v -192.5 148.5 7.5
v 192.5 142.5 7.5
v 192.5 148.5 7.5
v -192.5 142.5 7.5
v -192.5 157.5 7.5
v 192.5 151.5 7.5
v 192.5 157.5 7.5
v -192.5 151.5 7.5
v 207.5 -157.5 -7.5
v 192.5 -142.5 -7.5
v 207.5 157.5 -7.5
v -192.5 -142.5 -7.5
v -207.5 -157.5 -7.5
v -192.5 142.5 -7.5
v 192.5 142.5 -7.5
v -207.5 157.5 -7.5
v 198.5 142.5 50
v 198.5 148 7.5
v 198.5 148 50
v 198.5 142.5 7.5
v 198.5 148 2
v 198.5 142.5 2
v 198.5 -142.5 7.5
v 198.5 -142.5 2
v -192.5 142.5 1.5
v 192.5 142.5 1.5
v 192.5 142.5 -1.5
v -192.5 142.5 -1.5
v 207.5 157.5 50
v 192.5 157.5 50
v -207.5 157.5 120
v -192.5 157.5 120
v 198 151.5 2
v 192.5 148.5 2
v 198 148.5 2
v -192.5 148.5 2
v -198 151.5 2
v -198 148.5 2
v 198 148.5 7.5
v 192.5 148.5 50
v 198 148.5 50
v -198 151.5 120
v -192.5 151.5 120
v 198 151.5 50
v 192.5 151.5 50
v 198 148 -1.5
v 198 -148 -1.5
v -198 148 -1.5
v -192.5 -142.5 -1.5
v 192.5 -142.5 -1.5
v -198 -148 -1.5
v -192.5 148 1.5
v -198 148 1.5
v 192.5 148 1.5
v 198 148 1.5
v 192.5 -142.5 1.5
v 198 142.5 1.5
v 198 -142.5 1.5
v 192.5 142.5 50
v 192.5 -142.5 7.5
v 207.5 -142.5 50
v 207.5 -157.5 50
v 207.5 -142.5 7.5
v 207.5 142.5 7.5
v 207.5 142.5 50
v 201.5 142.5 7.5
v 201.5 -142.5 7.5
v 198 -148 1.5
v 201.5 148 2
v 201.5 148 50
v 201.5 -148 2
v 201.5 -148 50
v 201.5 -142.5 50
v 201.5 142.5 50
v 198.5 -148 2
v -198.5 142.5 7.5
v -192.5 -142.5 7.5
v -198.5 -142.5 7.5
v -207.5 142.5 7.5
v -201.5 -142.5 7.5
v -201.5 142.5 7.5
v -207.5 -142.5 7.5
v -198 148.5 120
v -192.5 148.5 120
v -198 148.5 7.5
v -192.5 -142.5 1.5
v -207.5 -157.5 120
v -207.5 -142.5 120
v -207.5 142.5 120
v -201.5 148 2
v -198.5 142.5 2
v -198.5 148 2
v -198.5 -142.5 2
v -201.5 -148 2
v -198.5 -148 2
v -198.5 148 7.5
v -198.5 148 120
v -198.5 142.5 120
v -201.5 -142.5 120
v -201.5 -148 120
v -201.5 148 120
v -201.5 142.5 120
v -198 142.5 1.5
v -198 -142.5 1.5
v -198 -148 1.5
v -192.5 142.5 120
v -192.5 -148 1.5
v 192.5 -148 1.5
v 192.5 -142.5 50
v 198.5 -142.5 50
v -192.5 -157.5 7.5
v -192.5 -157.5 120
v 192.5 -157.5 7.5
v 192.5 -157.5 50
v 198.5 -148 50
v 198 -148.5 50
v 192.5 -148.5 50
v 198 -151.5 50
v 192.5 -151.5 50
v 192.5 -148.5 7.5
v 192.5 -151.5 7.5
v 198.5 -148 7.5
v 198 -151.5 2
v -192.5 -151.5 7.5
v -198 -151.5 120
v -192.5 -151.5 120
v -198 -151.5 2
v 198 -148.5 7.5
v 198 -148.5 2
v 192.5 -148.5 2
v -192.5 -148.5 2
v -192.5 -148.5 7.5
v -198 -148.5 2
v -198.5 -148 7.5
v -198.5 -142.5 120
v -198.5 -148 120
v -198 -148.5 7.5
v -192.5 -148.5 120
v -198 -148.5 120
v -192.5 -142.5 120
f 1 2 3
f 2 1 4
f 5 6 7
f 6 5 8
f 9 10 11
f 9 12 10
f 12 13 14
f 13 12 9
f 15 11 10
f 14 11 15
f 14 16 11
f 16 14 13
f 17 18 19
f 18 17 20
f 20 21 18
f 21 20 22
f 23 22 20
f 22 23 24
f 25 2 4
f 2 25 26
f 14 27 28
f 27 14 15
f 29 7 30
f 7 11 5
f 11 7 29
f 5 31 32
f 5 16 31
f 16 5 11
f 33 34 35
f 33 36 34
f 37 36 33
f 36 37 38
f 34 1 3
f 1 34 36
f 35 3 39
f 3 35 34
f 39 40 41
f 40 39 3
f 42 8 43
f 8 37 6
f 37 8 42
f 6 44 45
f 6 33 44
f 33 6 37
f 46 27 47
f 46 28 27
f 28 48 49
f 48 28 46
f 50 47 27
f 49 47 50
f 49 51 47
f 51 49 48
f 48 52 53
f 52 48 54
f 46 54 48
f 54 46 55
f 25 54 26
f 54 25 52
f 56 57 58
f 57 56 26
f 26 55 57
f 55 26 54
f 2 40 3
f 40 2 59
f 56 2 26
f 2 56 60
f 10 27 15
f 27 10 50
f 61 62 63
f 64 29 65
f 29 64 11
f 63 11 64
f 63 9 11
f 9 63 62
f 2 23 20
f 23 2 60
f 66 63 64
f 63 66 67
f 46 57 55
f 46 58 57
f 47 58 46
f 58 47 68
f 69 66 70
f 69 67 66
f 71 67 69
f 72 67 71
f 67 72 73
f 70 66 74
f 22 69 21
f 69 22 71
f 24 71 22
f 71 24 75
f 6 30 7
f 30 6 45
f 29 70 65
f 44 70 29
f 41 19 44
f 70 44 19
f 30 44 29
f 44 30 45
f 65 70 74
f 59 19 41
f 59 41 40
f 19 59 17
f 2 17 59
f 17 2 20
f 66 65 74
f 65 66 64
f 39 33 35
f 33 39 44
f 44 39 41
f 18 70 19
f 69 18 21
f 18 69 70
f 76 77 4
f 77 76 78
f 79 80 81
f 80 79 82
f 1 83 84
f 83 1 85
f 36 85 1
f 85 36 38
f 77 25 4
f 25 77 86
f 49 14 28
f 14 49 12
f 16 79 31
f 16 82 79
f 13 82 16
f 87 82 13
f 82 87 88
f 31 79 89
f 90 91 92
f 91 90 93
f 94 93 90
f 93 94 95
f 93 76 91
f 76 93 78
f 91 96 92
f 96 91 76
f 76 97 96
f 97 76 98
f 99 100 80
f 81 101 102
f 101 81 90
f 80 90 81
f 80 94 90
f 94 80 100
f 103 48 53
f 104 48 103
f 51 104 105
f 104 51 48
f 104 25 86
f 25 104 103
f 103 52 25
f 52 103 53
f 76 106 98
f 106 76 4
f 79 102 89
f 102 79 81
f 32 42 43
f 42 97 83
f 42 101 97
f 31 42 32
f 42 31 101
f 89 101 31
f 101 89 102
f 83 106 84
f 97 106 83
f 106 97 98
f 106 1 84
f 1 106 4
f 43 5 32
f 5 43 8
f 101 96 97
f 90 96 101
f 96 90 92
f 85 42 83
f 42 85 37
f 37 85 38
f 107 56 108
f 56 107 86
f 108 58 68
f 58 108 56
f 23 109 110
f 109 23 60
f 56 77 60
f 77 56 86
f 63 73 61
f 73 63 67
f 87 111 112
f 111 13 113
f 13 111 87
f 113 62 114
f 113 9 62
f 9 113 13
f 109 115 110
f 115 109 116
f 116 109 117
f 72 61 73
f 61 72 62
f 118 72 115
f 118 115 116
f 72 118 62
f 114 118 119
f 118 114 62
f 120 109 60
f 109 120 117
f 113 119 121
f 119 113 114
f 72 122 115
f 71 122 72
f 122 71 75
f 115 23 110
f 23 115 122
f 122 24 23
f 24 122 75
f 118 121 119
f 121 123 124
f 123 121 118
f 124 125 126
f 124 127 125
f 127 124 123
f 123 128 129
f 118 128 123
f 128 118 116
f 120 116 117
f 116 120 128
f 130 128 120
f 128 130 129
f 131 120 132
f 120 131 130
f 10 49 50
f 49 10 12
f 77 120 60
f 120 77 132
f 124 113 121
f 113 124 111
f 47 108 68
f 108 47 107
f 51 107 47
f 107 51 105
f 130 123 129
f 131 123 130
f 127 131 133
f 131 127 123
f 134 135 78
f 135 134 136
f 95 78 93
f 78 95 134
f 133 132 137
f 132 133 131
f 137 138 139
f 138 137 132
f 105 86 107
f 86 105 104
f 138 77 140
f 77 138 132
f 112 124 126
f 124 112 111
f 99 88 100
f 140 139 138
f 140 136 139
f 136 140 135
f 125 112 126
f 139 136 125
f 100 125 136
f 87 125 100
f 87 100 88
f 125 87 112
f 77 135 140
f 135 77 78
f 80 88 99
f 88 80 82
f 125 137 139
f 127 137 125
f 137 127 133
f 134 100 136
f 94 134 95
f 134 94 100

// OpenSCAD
$fn = 20;
union()
{
  translate(v = [200, 150, 0])
  {
    rotate(a = [0, 0, 180], v = undef)
    {
      union()
      {
        translate(v = [100.75, 0, 0])
        {
          difference()
          {
            difference()
            {
              cube(size = [198.5, 15, 15], center = true);
              translate(v = [0, 0, 5.5])
              {
                cube(size = [199.5, 3, 7], center = true);
              }
            }
            rotate(a = [-90, 0, 0], v = undef)
            {
              translate(v = [0, 0, 5.5])
              {
                cube(size = [199.5, 3, 7], center = true);
              }
            }
          }
        }
        translate(v = [0, 75.75, 0])
        {
          rotate(a = [90, 0, 90], v = undef)
          {
            difference()
            {
              difference()
              {
                cube(size = [148.5, 15, 15], center = true);
                translate(v = [0, 0, 5.5])
                {
                  cube(size = [149.5, 3, 7], center = true);
                }
              }
              rotate(a = [-90, 0, 0], v = undef)
              {
                translate(v = [0, 0, 5.5])
                {
                  cube(size = [149.5, 3, 7], center = true);
                }
              }
            }
          }
        }
        translate(v = [-2.95, -2.95, 0])
        {
          cube(size = [9.1, 9.1, 15], center = true);
        }
        translate(v = [0, 0, 25.75])
        {
          rotate(a = [0, 90, 0], v = undef)
          {
            difference()
            {
              difference()
              {
                cube(size = [48.5, 15, 15], center = true);
                translate(v = [0, 0, 5.5])
                {
                  cube(size = [49.5, 3, 7], center = true);
                }
              }
              rotate(a = [-90, 0, 0], v = undef)
              {
                translate(v = [0, 0, 5.5])
                {
                  cube(size = [49.5, 3, 7], center = true);
                }
              }
            }
          }
        }
      }
    }
  }
  translate(v = [-200, 150, 0])
  {
    rotate(a = [0, 0, -90], v = undef)
    {
      union()
      {
        translate(v = [75.75, 0, 0])
        {
          difference()
          {
            difference()
            {
              cube(size = [148.5, 15, 15], center = true);
              translate(v = [0, 0, 5.5])
              {
                cube(size = [149.5, 3, 7], center = true);
              }
            }
            rotate(a = [-90, 0, 0], v = undef)
            {
              translate(v = [0, 0, 5.5])
              {
                cube(size = [149.5, 3, 7], center = true);
              }
            }
          }
        }
        translate(v = [0, 100.75, 0])
        {
          rotate(a = [90, 0, 90], v = undef)
          {
            difference()
            {
              difference()
              {
                cube(size = [198.5, 15, 15], center = true);
                translate(v = [0, 0, 5.5])
                {
                  cube(size = [199.5, 3, 7], center = true);
                }
              }
              rotate(a = [-90, 0, 0], v = undef)
              {
                translate(v = [0, 0, 5.5])
                {
                  cube(size = [199.5, 3, 7], center = true);
                }
              }
            }
          }
        }
        translate(v = [-2.95, -2.95, 0])
        {
          cube(size = [9.1, 9.1, 15], center = true);
        }
        translate(v = [0, 0, 60.75])
        {
          rotate(a = [0, 90, 0], v = undef)
          {
            difference()
            {
              difference()
              {
                cube(size = [118.5, 15, 15], center = true);
                translate(v = [0, 0, 5.5])
                {
                  cube(size = [119.5, 3, 7], center = true);
                }
              }
              rotate(a = [-90, 0, 0], v = undef)
              {
                translate(v = [0, 0, 5.5])
                {
                  cube(size = [119.5, 3, 7], center = true);
                }
              }
            }
          }
        }
      }
    }
  }
  translate(v = [200, -150, 0])
  {
    rotate(a = [0, 0, 90], v = undef)
    {
      union()
      {
        translate(v = [75.75, 0, 0])
        {
          difference()
          {
            difference()
            {
              cube(size = [148.5, 15, 15], center = true);
              translate(v = [0, 0, 5.5])
              {
                cube(size = [149.5, 3, 7], center = true);
              }
            }
            rotate(a = [-90, 0, 0], v = undef)
            {
              translate(v = [0, 0, 5.5])
              {
                cube(size = [149.5, 3, 7], center = true);
              }
            }
          }
        }
        translate(v = [0, 100.75, 0])
        {
          rotate(a = [90, 0, 90], v = undef)
          {
            difference()
            {
              difference()
              {
                cube(size = [198.5, 15, 15], center = true);
                translate(v = [0, 0, 5.5])
                {
                  cube(size = [199.5, 3, 7], center = true);
                }
              }
              rotate(a = [-90, 0, 0], v = undef)
              {
                translate(v = [0, 0, 5.5])
                {
                  cube(size = [199.5, 3, 7], center = true);
                }
              }
            }
          }
        }
        translate(v = [-2.95, -2.95, 0])
        {
          cube(size = [9.1, 9.1, 15], center = true);
        }
        translate(v = [0, 0, 25.75])
        {
          rotate(a = [0, 90, 0], v = undef)
          {
            difference()
            {
              difference()
              {
                cube(size = [48.5, 15, 15], center = true);
                translate(v = [0, 0, 5.5])
                {
                  cube(size = [49.5, 3, 7], center = true);
                }
              }
              rotate(a = [-90, 0, 0], v = undef)
              {
                translate(v = [0, 0, 5.5])
                {
                  cube(size = [49.5, 3, 7], center = true);
                }
              }
            }
          }
        }
      }
    }
  }
  translate(v = [-200, -150, 0])
  {
    rotate(a = [0, 0, 0], v = undef)
    {
      union()
      {
        translate(v = [100.75, 0, 0])
        {
          difference()
          {
            difference()
            {
              cube(size = [198.5, 15, 15], center = true);
              translate(v = [0, 0, 5.5])
              {
                cube(size = [199.5, 3, 7], center = true);
              }
            }
            rotate(a = [-90, 0, 0], v = undef)
            {
              translate(v = [0, 0, 5.5])
              {
                cube(size = [199.5, 3, 7], center = true);
              }
            }
          }
        }
        translate(v = [0, 75.75, 0])
        {
          rotate(a = [90, 0, 90], v = undef)
          {
            difference()
            {
              difference()
              {
                cube(size = [148.5, 15, 15], center = true);
                translate(v = [0, 0, 5.5])
                {
                  cube(size = [149.5, 3, 7], center = true);
                }
              }
              rotate(a = [-90, 0, 0], v = undef)
              {
                translate(v = [0, 0, 5.5])
                {
                  cube(size = [149.5, 3, 7], center = true);
                }
              }
            }
          }
        }
        translate(v = [-2.95, -2.95, 0])
        {
          cube(size = [9.1, 9.1, 15], center = true);
        }
        translate(v = [0, 0, 60.75])
        {
          rotate(a = [0, 90, 0], v = undef)
          {
            difference()
            {
              difference()
              {
                cube(size = [118.5, 15, 15], center = true);
                translate(v = [0, 0, 5.5])
                {
                  cube(size = [119.5, 3, 7], center = true);
                }
              }
              rotate(a = [-90, 0, 0], v = undef)
              {
                translate(v = [0, 0, 5.5])
                {
                  cube(size = [119.5, 3, 7], center = true);
                }
              }
            }
          }
        }
      }
    }
  }
}
